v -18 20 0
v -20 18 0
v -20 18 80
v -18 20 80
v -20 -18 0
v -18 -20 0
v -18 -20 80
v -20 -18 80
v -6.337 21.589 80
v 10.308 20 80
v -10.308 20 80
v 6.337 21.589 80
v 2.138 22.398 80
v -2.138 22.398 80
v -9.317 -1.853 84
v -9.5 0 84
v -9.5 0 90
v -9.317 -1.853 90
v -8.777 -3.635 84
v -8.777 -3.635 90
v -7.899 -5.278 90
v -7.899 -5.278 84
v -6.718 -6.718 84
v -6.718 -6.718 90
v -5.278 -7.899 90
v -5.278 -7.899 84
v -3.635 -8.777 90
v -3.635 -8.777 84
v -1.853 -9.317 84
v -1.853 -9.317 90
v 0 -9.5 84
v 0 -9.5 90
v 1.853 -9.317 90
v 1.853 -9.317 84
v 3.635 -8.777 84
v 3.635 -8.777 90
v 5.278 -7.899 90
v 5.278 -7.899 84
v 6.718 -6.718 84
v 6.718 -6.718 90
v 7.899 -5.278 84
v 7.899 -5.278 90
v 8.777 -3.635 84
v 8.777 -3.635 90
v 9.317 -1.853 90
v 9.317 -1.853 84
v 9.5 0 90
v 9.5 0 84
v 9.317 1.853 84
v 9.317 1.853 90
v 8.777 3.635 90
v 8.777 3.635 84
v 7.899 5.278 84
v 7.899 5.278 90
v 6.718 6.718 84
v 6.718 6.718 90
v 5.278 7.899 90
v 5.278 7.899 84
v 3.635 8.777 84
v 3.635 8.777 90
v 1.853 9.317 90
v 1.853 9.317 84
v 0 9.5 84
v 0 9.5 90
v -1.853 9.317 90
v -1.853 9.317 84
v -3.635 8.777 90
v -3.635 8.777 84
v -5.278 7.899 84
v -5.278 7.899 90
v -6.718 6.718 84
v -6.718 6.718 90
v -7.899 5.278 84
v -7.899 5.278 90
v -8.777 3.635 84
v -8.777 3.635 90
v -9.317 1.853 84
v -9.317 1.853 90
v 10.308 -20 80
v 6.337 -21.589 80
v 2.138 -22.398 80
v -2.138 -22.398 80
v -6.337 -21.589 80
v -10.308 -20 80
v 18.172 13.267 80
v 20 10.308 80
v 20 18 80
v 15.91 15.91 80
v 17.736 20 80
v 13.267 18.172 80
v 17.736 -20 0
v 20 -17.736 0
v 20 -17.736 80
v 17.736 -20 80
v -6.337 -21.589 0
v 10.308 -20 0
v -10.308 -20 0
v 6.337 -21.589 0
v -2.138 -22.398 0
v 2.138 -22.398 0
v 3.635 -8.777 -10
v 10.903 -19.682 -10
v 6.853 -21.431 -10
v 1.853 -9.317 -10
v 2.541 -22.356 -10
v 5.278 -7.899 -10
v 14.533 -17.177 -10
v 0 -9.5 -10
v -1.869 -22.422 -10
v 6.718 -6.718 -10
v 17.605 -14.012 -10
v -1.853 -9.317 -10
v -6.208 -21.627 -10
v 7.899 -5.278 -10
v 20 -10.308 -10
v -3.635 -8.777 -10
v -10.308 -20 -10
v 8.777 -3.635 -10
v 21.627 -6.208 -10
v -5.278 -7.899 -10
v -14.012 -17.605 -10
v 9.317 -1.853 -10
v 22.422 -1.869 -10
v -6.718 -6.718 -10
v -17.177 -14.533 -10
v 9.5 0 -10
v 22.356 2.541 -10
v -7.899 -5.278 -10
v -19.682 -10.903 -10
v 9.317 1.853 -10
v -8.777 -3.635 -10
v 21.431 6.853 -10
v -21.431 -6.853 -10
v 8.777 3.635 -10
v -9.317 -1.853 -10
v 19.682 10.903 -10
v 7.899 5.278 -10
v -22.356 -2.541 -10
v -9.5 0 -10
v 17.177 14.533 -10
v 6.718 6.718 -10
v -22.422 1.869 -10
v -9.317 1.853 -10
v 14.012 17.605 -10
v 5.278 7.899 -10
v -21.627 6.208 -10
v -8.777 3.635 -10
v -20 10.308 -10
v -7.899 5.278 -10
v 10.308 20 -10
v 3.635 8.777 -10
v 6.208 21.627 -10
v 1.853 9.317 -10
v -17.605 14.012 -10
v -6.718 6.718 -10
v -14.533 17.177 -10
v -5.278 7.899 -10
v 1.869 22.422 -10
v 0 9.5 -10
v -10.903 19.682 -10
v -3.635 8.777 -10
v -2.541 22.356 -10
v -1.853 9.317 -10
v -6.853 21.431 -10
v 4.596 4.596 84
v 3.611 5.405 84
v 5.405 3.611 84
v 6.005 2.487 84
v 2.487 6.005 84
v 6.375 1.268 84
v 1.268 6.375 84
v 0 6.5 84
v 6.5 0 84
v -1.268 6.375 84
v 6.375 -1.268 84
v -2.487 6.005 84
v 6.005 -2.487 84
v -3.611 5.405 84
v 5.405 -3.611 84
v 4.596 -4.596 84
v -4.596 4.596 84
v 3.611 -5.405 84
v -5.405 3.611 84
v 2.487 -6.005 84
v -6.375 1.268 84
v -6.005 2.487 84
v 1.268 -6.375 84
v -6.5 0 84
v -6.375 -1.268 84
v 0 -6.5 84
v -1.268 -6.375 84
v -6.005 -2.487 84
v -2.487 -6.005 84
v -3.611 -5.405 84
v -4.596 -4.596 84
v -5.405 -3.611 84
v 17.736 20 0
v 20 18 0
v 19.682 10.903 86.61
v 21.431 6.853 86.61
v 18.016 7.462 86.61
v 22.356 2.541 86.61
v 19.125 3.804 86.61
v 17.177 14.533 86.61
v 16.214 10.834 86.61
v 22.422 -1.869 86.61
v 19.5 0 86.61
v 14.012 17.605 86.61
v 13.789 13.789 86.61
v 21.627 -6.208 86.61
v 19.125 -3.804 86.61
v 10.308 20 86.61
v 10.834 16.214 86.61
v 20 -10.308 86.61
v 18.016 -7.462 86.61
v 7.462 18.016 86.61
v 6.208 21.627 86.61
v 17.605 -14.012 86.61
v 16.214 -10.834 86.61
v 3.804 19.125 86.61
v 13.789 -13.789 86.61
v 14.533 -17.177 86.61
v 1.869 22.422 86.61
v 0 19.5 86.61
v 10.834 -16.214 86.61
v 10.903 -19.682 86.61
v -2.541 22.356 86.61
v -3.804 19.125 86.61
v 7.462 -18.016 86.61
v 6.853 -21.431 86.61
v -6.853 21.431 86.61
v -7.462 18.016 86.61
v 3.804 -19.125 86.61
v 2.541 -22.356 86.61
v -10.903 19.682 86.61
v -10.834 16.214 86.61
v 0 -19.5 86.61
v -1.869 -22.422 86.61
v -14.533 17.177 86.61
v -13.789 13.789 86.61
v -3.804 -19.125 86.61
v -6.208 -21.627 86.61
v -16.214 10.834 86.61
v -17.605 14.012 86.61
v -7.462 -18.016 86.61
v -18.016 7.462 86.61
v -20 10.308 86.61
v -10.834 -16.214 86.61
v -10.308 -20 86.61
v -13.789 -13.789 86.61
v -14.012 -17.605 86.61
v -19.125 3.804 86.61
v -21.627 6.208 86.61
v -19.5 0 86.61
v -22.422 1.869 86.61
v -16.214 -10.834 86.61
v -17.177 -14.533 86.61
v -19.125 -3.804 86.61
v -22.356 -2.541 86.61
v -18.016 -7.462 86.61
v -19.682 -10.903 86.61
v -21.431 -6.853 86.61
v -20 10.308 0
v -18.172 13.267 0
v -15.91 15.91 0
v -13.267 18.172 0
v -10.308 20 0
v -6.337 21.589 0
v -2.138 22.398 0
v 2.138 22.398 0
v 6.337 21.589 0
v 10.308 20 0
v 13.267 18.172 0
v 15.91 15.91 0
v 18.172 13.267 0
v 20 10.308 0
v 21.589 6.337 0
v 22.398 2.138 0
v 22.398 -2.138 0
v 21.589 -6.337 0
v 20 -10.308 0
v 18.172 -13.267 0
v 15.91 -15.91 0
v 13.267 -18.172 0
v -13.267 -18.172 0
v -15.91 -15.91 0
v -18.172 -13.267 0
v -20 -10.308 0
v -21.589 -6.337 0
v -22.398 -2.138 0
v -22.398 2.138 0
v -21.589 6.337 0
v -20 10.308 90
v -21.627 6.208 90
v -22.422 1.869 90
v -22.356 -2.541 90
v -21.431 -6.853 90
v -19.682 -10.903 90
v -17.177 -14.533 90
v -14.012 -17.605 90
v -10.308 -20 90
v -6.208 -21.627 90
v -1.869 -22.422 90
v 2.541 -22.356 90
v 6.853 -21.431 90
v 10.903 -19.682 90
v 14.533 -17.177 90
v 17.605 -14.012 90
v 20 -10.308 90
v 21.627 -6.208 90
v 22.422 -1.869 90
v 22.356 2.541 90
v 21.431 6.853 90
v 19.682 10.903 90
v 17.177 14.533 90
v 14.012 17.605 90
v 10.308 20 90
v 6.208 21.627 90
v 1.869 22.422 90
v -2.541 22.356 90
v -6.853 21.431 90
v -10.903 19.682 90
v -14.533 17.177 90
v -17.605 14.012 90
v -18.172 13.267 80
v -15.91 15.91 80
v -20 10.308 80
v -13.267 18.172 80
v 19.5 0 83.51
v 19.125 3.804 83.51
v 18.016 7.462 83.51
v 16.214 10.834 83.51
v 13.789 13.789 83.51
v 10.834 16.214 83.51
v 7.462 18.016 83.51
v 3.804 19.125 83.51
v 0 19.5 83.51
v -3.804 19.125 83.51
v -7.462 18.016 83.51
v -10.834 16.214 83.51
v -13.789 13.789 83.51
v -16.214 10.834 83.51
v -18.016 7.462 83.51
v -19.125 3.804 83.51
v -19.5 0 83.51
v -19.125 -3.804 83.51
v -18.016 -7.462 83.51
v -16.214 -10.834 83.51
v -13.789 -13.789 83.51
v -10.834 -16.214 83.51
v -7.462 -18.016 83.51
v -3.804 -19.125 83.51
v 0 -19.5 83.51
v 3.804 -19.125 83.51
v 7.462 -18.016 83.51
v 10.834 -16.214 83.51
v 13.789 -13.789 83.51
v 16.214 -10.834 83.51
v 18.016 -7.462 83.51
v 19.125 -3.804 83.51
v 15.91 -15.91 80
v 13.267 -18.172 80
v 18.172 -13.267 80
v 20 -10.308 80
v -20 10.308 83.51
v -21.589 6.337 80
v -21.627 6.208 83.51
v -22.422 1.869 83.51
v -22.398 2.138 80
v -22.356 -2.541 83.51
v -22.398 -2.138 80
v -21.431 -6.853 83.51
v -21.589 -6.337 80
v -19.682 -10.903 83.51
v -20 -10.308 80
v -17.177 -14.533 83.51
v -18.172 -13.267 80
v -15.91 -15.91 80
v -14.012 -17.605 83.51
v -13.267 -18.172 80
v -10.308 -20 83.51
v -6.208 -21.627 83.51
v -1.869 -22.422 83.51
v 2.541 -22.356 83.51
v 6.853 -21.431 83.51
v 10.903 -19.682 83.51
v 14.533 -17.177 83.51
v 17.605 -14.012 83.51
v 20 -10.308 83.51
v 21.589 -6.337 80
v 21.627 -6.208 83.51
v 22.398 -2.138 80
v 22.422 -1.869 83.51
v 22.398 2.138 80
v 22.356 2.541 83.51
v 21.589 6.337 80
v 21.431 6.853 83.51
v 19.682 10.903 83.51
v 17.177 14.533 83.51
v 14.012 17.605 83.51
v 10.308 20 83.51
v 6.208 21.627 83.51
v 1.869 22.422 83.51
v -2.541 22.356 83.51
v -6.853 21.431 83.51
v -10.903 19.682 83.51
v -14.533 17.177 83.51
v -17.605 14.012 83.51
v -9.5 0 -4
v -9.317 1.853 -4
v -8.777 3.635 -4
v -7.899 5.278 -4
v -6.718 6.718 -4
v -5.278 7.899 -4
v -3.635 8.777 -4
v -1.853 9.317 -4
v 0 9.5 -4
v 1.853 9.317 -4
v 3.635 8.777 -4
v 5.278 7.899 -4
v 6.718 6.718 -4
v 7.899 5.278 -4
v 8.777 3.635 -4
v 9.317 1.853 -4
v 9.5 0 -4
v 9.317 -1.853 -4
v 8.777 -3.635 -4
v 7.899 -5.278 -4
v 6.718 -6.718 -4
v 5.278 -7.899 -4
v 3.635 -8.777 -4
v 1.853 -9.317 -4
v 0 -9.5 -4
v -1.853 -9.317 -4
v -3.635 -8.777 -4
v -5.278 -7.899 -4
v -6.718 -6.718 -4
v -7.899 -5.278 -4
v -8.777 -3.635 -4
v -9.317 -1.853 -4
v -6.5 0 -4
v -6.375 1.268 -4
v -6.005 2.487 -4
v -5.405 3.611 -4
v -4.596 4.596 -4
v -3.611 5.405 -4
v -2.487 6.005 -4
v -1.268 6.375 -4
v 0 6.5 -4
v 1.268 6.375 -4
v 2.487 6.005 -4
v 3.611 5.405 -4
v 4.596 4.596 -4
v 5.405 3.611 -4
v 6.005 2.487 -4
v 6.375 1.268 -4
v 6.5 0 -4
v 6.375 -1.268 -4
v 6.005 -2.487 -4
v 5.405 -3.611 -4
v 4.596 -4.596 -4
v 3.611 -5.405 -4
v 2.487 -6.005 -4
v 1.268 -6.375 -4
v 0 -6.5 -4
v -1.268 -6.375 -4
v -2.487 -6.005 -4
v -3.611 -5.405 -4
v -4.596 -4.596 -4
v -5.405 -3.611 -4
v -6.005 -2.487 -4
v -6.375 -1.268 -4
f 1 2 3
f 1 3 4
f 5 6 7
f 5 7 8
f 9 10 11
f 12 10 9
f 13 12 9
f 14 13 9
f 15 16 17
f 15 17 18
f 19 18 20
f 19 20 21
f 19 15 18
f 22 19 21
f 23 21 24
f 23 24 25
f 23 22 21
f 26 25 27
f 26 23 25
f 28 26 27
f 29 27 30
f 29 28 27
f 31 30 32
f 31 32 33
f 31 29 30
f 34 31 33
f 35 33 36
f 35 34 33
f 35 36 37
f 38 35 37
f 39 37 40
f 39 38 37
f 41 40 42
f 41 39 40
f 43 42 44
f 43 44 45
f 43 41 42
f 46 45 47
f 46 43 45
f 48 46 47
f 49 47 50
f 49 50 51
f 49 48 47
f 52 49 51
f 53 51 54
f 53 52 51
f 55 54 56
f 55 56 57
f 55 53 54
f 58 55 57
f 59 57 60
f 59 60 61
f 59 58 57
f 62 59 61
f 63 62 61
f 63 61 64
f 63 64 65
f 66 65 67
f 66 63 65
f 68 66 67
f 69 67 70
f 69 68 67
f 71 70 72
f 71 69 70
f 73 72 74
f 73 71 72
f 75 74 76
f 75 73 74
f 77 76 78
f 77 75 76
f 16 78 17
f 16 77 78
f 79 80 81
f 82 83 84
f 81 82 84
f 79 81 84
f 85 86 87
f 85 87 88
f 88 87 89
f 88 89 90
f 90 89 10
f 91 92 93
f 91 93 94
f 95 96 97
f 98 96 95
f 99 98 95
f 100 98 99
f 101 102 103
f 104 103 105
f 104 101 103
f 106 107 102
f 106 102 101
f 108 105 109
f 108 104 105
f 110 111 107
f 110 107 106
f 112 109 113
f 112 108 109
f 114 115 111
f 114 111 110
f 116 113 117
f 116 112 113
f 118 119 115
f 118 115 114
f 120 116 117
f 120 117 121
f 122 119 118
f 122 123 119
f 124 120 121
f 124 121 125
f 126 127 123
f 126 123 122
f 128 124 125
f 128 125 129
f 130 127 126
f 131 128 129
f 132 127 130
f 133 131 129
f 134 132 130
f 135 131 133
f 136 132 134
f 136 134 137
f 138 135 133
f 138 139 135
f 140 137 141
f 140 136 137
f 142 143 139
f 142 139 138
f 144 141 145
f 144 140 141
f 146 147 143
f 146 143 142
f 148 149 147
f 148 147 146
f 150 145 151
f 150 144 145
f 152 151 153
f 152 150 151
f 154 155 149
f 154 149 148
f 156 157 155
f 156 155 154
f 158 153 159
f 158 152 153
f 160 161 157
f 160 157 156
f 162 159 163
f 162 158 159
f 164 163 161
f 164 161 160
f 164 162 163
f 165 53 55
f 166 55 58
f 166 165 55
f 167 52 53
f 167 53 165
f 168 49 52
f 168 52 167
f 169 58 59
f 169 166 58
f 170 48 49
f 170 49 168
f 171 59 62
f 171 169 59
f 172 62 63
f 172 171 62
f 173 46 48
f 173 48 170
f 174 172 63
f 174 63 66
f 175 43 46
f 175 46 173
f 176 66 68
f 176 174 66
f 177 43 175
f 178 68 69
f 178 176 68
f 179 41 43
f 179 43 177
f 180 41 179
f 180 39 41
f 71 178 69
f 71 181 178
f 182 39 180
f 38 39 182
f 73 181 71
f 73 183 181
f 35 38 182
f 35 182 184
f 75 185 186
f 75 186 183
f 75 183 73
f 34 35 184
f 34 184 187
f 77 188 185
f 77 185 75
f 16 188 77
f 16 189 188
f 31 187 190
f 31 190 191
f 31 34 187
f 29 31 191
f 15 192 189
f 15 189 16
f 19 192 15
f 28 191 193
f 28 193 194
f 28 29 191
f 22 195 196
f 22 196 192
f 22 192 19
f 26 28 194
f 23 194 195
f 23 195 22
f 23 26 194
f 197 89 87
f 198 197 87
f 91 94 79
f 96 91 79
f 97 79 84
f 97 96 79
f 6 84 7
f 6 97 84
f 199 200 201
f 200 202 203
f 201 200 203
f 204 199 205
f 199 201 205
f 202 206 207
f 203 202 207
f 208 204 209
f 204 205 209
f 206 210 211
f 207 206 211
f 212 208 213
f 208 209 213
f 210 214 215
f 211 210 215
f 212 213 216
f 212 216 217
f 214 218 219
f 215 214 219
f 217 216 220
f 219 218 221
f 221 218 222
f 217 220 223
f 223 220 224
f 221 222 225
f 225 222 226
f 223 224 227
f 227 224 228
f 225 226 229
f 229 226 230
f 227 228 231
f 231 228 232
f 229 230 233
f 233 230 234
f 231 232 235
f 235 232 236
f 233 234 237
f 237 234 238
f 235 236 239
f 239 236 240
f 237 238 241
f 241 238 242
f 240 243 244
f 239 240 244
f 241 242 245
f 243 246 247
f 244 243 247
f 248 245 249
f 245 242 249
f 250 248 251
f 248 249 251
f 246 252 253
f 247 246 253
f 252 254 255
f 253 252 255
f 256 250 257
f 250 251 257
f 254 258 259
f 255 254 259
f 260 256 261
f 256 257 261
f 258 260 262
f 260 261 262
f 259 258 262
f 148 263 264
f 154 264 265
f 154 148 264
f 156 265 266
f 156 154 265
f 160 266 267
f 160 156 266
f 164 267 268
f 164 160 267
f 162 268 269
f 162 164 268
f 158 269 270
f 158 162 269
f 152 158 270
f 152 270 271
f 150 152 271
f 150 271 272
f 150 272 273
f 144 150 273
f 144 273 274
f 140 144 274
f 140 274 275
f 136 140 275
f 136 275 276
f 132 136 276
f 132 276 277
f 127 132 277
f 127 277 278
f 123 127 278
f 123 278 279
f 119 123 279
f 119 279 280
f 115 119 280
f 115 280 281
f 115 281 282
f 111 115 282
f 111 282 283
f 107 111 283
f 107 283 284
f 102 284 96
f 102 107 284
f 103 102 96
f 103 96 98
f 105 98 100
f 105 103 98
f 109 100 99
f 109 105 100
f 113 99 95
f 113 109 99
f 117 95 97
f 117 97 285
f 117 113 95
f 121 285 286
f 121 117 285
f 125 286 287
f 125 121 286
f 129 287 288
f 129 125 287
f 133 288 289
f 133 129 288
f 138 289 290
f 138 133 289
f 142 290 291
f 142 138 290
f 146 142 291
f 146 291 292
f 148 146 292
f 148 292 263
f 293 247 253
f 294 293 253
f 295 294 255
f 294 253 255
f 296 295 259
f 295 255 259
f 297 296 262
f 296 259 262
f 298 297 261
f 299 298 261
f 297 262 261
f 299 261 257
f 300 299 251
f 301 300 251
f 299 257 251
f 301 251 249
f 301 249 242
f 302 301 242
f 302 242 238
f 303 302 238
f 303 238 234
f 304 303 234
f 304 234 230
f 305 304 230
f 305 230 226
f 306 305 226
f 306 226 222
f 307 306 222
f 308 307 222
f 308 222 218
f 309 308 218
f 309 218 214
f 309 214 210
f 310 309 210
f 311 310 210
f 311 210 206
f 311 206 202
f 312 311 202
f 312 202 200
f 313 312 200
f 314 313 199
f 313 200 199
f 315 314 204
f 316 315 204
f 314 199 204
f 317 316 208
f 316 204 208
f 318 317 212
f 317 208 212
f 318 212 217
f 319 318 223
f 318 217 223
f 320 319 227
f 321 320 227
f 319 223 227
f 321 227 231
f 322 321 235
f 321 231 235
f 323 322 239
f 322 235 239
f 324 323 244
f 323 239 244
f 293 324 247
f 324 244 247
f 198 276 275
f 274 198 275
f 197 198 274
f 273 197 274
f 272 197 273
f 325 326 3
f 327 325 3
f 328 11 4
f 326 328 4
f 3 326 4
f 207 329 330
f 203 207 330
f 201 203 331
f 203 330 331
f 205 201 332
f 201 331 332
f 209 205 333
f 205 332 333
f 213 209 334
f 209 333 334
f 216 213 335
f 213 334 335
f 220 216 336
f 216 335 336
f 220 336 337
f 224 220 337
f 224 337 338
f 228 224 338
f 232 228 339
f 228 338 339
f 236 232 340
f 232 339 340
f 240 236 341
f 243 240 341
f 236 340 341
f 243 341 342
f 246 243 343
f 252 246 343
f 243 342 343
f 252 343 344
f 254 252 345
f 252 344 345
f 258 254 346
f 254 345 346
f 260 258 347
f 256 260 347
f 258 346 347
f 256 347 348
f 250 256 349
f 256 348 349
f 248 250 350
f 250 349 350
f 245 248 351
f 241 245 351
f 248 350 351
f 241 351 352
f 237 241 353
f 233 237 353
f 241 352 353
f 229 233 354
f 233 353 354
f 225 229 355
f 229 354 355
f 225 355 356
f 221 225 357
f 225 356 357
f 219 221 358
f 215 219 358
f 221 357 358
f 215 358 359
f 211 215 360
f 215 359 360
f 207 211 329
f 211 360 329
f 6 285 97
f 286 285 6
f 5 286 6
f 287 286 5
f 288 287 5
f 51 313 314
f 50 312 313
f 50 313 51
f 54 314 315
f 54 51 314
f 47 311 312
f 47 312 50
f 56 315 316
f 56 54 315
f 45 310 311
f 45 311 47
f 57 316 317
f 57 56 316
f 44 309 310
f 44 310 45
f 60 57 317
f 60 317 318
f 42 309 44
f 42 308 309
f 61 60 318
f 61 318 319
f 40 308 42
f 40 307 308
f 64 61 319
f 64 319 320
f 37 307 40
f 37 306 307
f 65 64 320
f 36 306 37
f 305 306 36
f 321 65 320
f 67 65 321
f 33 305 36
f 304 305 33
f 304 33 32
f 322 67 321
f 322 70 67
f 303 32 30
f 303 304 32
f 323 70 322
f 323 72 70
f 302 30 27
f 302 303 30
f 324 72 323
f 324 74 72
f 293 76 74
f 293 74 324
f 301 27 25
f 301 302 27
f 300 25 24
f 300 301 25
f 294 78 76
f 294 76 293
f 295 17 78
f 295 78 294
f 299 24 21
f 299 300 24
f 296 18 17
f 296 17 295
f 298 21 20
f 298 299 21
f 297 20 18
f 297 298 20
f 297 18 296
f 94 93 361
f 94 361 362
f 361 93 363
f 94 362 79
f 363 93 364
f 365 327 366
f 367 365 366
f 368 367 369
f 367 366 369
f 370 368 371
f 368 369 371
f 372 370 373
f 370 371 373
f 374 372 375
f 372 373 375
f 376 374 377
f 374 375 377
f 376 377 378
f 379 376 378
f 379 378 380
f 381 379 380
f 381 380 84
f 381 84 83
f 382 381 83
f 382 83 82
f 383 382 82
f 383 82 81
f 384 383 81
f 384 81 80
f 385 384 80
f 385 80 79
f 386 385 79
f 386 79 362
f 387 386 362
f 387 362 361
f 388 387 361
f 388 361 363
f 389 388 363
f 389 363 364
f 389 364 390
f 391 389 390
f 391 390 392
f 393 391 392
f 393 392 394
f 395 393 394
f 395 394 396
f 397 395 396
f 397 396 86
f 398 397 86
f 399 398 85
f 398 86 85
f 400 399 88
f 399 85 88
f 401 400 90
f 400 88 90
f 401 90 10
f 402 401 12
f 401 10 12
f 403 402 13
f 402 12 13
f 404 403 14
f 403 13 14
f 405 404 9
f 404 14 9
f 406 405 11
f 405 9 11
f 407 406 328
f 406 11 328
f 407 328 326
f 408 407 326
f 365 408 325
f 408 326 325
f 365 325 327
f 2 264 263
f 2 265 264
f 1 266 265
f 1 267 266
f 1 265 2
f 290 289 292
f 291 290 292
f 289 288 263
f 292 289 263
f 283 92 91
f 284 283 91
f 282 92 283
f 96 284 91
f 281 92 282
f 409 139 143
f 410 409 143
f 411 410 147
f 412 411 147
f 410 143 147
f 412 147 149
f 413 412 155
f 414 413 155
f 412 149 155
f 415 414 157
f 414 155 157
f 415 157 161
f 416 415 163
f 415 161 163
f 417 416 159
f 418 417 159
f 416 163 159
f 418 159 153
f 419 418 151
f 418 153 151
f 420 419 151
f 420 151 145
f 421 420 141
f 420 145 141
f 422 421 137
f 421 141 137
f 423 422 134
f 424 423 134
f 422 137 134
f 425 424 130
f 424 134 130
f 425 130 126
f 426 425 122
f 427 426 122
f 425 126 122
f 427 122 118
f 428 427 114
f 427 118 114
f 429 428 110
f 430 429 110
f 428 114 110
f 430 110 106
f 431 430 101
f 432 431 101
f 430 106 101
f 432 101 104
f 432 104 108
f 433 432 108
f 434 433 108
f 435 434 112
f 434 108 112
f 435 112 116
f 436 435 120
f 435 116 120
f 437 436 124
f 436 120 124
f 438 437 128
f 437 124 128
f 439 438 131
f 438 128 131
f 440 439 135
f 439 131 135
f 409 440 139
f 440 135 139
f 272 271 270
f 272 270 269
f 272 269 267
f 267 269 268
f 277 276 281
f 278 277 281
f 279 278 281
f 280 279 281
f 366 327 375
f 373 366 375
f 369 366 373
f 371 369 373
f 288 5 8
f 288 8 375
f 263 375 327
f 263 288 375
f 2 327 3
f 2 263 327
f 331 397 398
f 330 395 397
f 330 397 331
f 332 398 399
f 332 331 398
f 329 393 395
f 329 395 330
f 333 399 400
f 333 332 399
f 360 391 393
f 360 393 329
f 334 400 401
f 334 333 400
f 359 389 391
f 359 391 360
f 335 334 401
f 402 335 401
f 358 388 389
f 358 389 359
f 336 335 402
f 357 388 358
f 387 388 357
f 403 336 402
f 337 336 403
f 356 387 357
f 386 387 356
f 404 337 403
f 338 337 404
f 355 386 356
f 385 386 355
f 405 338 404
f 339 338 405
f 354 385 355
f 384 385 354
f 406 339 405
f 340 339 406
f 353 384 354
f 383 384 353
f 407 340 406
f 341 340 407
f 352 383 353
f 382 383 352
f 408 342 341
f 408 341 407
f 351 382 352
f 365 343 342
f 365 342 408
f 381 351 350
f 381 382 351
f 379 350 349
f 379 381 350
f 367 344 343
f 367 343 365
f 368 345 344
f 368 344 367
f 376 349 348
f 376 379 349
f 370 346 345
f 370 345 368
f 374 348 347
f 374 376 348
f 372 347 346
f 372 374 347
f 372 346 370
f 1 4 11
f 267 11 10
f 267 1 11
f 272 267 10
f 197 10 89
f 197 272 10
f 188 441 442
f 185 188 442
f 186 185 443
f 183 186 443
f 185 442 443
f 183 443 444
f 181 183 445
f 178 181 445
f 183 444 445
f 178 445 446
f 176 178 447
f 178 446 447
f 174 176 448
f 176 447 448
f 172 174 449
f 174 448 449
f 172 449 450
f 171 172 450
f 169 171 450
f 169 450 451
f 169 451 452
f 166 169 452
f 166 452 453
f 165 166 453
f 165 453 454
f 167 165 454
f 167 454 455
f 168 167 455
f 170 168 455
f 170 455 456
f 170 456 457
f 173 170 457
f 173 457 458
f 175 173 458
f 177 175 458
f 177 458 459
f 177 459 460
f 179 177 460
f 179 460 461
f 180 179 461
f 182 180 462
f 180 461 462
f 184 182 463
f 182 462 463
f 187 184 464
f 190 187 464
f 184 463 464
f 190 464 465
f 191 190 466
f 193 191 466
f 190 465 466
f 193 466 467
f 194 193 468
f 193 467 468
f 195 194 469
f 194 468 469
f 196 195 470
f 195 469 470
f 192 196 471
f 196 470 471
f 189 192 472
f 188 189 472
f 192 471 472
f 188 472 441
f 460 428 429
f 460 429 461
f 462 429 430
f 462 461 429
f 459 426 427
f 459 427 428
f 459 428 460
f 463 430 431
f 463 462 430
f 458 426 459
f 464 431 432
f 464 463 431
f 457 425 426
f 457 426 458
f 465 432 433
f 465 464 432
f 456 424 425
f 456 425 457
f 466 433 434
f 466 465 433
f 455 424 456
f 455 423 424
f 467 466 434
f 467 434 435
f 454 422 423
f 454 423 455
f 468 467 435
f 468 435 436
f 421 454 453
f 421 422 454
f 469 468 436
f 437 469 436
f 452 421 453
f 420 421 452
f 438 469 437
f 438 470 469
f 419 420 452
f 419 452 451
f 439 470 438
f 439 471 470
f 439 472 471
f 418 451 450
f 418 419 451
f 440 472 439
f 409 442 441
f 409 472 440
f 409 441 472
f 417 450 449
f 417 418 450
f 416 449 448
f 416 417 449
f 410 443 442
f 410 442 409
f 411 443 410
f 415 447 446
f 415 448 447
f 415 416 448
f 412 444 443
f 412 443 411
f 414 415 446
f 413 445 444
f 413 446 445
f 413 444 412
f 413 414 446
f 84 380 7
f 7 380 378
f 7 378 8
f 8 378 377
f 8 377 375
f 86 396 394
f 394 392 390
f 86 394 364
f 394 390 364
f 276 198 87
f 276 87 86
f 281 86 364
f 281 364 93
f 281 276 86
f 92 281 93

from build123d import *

# Parameters (mm, degrees)
EXTRUDE_1_DEPTH     = 80
SKETCH_3_R          = 22.5
EXTRUDE_2_DEPTH     = 10
EXTRUDE_START       = 10
SKETCH_4_R          = 22.5
EXTRUDE_3_DEPTH     = 10
SKETCH_6_R          = 9.5
CUT_EXTRUDE_3_DEPTH = 6
CUT_EXTRUDE_START   = -6
SKETCH_7_R          = 9.5
CUT_EXTRUDE_4_DEPTH = 6
SKETCH_8_R          = 6.5
CUT_EXTRUDE_5_DEPTH = 100
CUT_EXTRUDE_START_2 = -6.49
SKETCH_9_R          = 22.5
SKETCH_9_R_2        = 19.5
CUT_EXTRUDE_7_DEPTH = 3.1


with BuildPart() as part:
    # 草图1 → 凸台-拉伸1 (new body)
    with BuildSketch(Plane.XY):
        Polygon((-20, 18), (-18, 20), (17.735809733, 20), (20, 18), (20, -17.735809733), (17.735809733, -20), (-18, -20), (-20, -18), align=None)
    extrude(amount=EXTRUDE_1_DEPTH)

    # 草图3 → 凸台-拉伸2 (add)
    with BuildSketch(Plane.XY.offset(80)):
        with Locations(Location((0, 0, 0), (0, 0, 152.733955549))):
            Circle(SKETCH_3_R)
    extrude(amount=EXTRUDE_2_DEPTH)

    # 草图4 → 凸台-拉伸3 (add)
    with BuildSketch(Plane(origin=(0, 0, 0), x_dir=(-1, 0, 0), z_dir=(0, 0, -1)).offset(EXTRUDE_START)):
        with Locations(Location((0, 0, 0), (0, 0, 27.266044451))):
            Circle(SKETCH_4_R)
    extrude(amount=-EXTRUDE_3_DEPTH)

    # 草图6 → 切除-拉伸3 (cut)
    with BuildSketch(Plane(origin=(0, 0, -10), x_dir=(-1, 0, 0), z_dir=(0, 0, -1))):
        Circle(SKETCH_6_R)
    extrude(amount=-CUT_EXTRUDE_3_DEPTH, mode=Mode.SUBTRACT)

    # 草图7 → 切除-拉伸4 (cut)
    with BuildSketch(Plane.XY.offset(90).offset(CUT_EXTRUDE_START)):
        with Locations(Location((0, 0, 0), (0, 0, 180))):
            Circle(SKETCH_7_R)
    extrude(amount=CUT_EXTRUDE_4_DEPTH, mode=Mode.SUBTRACT)

    # 草图8 → 切除-拉伸5 (cut)
    with BuildSketch(Plane(origin=(0, 0, -10), x_dir=(-1, 0, 0), z_dir=(0, 0, -1))):
        Circle(SKETCH_8_R)
    extrude(amount=-CUT_EXTRUDE_5_DEPTH, mode=Mode.SUBTRACT)

    # 草图9 → 切除-拉伸7 (cut)
    with BuildSketch(Plane.XY.offset(90).offset(CUT_EXTRUDE_START_2)):
        with Locations(Location((0, 0, 0), (0, 0, 152.733955549))):
            Circle(SKETCH_9_R)
        Circle(SKETCH_9_R_2, mode=Mode.SUBTRACT)
    extrude(amount=CUT_EXTRUDE_7_DEPTH, mode=Mode.SUBTRACT)


solid = part.part
